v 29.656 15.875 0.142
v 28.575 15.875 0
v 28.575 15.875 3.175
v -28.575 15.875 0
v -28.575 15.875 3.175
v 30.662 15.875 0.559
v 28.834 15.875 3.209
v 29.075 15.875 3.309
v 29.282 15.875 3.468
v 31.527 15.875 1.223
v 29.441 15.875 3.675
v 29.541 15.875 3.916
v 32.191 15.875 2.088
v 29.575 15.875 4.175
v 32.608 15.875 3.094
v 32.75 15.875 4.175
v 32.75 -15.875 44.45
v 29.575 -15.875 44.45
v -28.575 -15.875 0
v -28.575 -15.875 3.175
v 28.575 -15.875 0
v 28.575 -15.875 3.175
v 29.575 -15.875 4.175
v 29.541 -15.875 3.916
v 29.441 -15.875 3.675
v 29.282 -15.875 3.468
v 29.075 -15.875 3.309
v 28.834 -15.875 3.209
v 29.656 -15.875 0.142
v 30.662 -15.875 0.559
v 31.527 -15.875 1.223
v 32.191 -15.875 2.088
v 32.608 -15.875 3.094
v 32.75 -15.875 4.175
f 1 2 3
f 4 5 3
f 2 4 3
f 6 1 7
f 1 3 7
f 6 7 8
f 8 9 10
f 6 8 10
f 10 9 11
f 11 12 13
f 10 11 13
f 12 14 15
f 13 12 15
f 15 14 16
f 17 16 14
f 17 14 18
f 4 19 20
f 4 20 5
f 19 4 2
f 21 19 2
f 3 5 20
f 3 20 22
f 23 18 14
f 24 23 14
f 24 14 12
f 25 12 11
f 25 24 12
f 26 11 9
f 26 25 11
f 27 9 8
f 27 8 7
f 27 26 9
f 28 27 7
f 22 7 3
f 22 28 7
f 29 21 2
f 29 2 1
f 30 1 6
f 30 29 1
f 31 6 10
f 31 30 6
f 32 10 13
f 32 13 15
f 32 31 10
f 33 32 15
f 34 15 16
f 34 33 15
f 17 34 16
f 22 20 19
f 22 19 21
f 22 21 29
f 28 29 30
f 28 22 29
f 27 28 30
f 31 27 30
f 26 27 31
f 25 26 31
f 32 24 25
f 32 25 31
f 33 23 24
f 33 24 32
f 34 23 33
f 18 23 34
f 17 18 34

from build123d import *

# Parameters (mm, degrees)
SKETCH2_W          = 57.15
SKETCH2_H          = 31.75
BASE_FLANGE1_DEPTH = 3.175
EDGE_FLANGE1_DEPTH = 31.75
CUT_EXTRUDE1_DEPTH = 3.175


# Sheet-metal steps are written as plain solids
with BuildPart() as part:
    # Sketch2 → Base-Flange1 (new body)
    with BuildSketch(Plane.XY):
        Rectangle(SKETCH2_W, SKETCH2_H)
    extrude(amount=BASE_FLANGE1_DEPTH)

    # Edge-Flange1 section (across the edge) → Edge-Flange1 (add)
    with BuildSketch(Plane(origin=(29.575, -15.875, 3.175), x_dir=(-1, 0, 0), z_dir=(0, 1, 0))):
        with BuildLine():
            Line((-3.175, 1), (-3.175, 41.275))
            Line((-3.175, 41.275), (0, 41.275))
            Line((0, 41.275), (0, 1))
            ThreePointArc((0, 1), (0.292893219, 0.292893219), (1, 0))
            Line((1, 0), (1, -3.175))
            ThreePointArc((1, -3.175), (-1.952170811, -1.952170811), (-3.175, 1))
        make_face()
    extrude(amount=EDGE_FLANGE1_DEPTH)

    # Sketch10 → Cut-Extrude1 (cut)
    with BuildSketch(Plane(origin=(32.75, 0, 0), x_dir=(0, 0, -1), z_dir=(1, 0, 0))):
        Polygon((-4.175, 15.875), (-44.45, -15.875), (-44.45, 15.875), align=None)
    extrude(amount=-CUT_EXTRUDE1_DEPTH, mode=Mode.SUBTRACT)


solid = part.part
